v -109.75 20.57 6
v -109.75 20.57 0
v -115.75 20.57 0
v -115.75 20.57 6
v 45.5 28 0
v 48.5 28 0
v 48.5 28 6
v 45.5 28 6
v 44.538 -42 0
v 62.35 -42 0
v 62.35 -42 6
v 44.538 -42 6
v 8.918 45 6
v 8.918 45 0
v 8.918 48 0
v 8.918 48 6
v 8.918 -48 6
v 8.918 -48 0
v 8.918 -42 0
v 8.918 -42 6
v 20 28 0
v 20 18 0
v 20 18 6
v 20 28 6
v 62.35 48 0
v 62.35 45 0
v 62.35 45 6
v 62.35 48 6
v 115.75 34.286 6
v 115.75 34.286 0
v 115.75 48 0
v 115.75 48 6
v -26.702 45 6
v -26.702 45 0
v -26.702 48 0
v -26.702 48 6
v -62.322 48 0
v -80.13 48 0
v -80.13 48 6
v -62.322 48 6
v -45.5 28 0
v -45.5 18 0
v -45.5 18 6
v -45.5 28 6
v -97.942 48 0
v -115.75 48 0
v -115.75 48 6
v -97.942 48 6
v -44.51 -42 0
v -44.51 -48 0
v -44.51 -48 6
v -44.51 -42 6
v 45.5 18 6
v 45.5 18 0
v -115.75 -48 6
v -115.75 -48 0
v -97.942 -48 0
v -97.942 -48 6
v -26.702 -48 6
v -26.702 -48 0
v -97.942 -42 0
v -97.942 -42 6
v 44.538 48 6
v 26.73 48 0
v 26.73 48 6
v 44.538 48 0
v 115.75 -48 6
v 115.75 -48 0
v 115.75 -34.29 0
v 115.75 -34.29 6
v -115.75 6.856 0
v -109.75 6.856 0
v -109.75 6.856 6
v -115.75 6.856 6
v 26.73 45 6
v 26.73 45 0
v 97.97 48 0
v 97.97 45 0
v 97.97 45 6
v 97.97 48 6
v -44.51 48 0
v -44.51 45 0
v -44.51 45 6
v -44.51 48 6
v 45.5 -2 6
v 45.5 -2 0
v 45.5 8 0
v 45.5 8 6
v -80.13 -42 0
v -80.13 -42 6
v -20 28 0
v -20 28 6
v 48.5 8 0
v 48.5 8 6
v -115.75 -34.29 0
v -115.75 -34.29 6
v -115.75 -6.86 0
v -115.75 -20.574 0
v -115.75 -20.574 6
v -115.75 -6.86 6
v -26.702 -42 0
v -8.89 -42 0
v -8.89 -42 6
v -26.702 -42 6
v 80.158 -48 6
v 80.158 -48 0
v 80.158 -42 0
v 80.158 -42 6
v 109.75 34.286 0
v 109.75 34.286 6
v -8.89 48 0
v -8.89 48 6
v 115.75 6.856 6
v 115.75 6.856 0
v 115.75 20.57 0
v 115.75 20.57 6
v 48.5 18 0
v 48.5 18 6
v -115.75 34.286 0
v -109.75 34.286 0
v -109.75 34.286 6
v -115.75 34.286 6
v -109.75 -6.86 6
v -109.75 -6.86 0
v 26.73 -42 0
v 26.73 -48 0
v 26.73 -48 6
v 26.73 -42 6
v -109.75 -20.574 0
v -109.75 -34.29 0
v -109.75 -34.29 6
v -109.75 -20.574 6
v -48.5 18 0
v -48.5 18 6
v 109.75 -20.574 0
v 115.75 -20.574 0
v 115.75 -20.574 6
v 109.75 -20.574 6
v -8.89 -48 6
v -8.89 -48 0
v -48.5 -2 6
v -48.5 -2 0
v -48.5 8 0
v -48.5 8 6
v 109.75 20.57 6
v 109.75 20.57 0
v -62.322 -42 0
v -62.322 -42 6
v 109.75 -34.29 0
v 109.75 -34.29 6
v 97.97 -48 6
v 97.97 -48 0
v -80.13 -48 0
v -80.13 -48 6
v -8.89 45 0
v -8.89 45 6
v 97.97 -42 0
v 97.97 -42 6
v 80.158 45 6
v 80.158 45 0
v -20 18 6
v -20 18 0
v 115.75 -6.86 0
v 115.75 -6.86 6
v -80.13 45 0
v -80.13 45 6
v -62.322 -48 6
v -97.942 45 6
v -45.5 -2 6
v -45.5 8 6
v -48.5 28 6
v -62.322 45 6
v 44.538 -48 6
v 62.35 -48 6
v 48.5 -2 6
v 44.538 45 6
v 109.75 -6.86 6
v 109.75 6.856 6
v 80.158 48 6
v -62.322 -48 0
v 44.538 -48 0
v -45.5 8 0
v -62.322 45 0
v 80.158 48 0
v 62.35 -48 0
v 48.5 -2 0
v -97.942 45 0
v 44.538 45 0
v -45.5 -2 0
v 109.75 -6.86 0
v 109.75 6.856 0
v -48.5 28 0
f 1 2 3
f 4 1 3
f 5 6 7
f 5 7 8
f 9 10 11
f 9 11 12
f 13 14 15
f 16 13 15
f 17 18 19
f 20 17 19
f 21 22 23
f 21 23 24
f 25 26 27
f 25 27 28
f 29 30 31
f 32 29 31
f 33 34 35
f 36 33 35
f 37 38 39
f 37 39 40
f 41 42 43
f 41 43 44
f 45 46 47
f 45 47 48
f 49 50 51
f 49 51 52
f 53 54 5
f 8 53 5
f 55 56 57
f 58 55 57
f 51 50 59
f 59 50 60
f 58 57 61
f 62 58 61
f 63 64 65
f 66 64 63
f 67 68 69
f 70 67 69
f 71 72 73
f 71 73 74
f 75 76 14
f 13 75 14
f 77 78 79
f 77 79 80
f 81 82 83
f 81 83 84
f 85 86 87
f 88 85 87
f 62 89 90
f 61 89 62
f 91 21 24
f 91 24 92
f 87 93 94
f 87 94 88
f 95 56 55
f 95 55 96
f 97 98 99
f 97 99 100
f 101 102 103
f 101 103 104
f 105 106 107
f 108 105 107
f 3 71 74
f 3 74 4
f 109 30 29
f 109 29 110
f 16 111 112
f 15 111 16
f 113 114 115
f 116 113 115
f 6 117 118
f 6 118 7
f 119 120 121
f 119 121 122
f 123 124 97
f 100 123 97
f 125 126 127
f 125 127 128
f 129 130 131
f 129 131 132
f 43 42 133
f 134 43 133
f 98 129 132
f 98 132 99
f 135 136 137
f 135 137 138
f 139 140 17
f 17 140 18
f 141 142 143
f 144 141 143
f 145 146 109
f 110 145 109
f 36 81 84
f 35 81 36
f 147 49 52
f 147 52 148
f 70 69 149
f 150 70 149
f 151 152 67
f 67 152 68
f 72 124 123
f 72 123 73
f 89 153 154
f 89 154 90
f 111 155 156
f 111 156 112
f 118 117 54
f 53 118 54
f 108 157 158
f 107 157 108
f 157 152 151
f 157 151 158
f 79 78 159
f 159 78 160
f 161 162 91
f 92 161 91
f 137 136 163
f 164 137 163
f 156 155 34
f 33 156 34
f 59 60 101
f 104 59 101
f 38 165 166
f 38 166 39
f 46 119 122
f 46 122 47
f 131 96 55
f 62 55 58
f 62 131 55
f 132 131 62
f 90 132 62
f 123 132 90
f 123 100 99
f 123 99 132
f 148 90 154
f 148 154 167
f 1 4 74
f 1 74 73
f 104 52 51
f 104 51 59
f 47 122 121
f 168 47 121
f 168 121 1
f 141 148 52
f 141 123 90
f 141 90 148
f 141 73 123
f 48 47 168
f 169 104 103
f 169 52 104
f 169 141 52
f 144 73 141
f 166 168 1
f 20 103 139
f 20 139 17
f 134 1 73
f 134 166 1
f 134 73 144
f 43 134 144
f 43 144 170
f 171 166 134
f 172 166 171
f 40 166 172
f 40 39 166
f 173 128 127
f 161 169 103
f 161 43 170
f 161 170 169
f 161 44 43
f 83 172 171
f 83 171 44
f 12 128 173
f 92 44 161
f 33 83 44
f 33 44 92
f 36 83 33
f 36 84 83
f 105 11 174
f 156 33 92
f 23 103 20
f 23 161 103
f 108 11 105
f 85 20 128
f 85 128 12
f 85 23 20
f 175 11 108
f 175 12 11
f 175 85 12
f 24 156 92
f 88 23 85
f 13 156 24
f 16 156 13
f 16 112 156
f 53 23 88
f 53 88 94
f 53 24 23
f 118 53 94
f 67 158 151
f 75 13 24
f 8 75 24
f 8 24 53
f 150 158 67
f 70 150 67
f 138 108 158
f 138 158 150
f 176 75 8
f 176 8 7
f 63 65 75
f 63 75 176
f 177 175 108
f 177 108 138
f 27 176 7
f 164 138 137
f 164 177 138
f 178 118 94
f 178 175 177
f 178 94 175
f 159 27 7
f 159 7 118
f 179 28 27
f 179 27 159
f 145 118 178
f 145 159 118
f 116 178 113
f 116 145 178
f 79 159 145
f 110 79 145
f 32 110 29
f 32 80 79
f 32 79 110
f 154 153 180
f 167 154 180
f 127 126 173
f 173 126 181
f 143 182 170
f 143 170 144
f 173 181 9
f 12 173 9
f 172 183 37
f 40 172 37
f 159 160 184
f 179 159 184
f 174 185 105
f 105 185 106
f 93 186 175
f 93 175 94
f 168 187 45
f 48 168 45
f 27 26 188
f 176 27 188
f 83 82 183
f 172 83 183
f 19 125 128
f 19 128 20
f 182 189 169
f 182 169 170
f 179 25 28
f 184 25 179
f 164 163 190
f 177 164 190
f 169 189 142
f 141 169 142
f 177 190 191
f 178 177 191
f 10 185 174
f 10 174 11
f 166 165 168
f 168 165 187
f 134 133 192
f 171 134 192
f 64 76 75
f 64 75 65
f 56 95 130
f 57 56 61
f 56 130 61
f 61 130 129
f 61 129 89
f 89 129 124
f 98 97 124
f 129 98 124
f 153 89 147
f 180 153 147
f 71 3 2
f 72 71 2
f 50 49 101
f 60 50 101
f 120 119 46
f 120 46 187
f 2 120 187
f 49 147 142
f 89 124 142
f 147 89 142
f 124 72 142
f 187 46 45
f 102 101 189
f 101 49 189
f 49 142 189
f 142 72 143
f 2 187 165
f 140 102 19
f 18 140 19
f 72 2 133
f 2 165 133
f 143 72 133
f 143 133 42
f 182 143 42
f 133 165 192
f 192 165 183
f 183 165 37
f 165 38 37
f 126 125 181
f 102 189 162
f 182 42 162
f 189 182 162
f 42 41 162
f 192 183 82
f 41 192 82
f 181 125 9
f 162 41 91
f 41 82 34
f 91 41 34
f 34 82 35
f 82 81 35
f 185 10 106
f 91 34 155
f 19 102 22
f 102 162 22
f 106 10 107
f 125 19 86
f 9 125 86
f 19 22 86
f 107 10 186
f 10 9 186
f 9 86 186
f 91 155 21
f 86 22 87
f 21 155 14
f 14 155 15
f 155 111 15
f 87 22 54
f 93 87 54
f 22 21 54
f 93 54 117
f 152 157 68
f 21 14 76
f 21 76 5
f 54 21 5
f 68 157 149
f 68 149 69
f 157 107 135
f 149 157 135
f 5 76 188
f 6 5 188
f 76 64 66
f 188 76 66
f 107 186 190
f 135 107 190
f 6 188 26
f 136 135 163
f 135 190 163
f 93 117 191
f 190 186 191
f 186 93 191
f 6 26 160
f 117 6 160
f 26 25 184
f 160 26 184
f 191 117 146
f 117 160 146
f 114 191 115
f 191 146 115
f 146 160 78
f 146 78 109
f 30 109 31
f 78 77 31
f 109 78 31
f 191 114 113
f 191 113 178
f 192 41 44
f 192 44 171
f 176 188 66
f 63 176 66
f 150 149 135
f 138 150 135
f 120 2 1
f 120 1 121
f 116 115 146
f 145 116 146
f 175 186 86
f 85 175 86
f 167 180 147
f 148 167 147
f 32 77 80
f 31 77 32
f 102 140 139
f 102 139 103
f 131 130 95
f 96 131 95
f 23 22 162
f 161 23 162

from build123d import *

# Parameters (mm, degrees)
ESBO_O1_W                = 231.5
ESBO_O1_H                = 96
RESSALTO_EXTRUS_O1_DEPTH = 6
CORTE_EXTRUS_O1_REACH    = 127.451
ESBO_O2_W                = 17.812307692
ESBO_O2_H                = 6
CORTE_EXTRUS_O3_REACH    = 127.451
ESBO_O4_W                = 6
ESBO_O4_H                = 13.715714286
CORTE_EXTRUS_O4_REACH    = 127.451
ESBO_O5_W                = 40
ESBO_O5_H                = 10
CORTE_EXTRUS_O5_REACH    = 127.451
ESBO_O6_W                = 3
ESBO_O6_H                = 10


with BuildPart() as part:
    # Esboço1 → Ressalto-extrusão1 (new body)
    with BuildSketch(Plane.XY):
        Rectangle(ESBO_O1_W, ESBO_O1_H)
    extrude(amount=RESSALTO_EXTRUS_O1_DEPTH)

    # Esboço2 → Corte-extrusão1 (cut, up to next)
    with BuildSketch(Plane(origin=(0, 0, 0), x_dir=(-1, 0, 0), z_dir=(0, 0, -1)), mode=Mode.PRIVATE) as corte_extrus_o1_sk1:
        with Locations((17.796153846, -45)):
            Rectangle(ESBO_O2_W, ESBO_O2_H)
    corte_extrus_o1_tool1 = extrude(corte_extrus_o1_sk1.sketch, amount=-CORTE_EXTRUS_O1_REACH, mode=Mode.PRIVATE) & part.part
    # Esboço2 → Corte-extrusão1 (cut, up to next)
    with BuildSketch(Plane(origin=(0, 0, 0), x_dir=(-1, 0, 0), z_dir=(0, 0, -1)), mode=Mode.PRIVATE) as corte_extrus_o1_sk2:
        with Locations((53.416153846, -45)):
            Rectangle(ESBO_O2_W, ESBO_O2_H)
    corte_extrus_o1_tool2 = extrude(corte_extrus_o1_sk2.sketch, amount=-CORTE_EXTRUS_O1_REACH, mode=Mode.PRIVATE) & part.part
    # Esboço2 → Corte-extrusão1 (cut, up to next)
    with BuildSketch(Plane(origin=(0, 0, 0), x_dir=(-1, 0, 0), z_dir=(0, 0, -1)), mode=Mode.PRIVATE) as corte_extrus_o1_sk3:
        with Locations((89.036153846, -45)):
            Rectangle(ESBO_O2_W, ESBO_O2_H)
    corte_extrus_o1_tool3 = extrude(corte_extrus_o1_sk3.sketch, amount=-CORTE_EXTRUS_O1_REACH, mode=Mode.PRIVATE) & part.part
    # Esboço2 → Corte-extrusão1 (cut, up to next)
    with BuildSketch(Plane(origin=(0, 0, 0), x_dir=(-1, 0, 0), z_dir=(0, 0, -1)), mode=Mode.PRIVATE) as corte_extrus_o1_sk4:
        with Locations((-17.823846154, -45)):
            Rectangle(ESBO_O2_W, ESBO_O2_H)
    corte_extrus_o1_tool4 = extrude(corte_extrus_o1_sk4.sketch, amount=-CORTE_EXTRUS_O1_REACH, mode=Mode.PRIVATE) & part.part
    # Esboço2 → Corte-extrusão1 (cut, up to next)
    with BuildSketch(Plane(origin=(0, 0, 0), x_dir=(-1, 0, 0), z_dir=(0, 0, -1)), mode=Mode.PRIVATE) as corte_extrus_o1_sk5:
        with Locations((-53.443846154, -45)):
            Rectangle(ESBO_O2_W, ESBO_O2_H)
    corte_extrus_o1_tool5 = extrude(corte_extrus_o1_sk5.sketch, amount=-CORTE_EXTRUS_O1_REACH, mode=Mode.PRIVATE) & part.part
    # Esboço2 → Corte-extrusão1 (cut, up to next)
    with BuildSketch(Plane(origin=(0, 0, 0), x_dir=(-1, 0, 0), z_dir=(0, 0, -1)), mode=Mode.PRIVATE) as corte_extrus_o1_sk6:
        with Locations((-89.063846154, -45)):
            Rectangle(ESBO_O2_W, ESBO_O2_H)
    corte_extrus_o1_tool6 = extrude(corte_extrus_o1_sk6.sketch, amount=-CORTE_EXTRUS_O1_REACH, mode=Mode.PRIVATE) & part.part
    # Esboço2 → Corte-extrusão1 (cut, up to next)
    with BuildSketch(Plane(origin=(0, 0, 0), x_dir=(-1, 0, 0), z_dir=(0, 0, -1)), mode=Mode.PRIVATE) as corte_extrus_o1_sk7:
        with Locations((-89.063846154, 48)):
            Rectangle(ESBO_O2_W, ESBO_O2_H)
    corte_extrus_o1_tool7 = extrude(corte_extrus_o1_sk7.sketch, amount=-CORTE_EXTRUS_O1_REACH, mode=Mode.PRIVATE) & part.part
    # Esboço2 → Corte-extrusão1 (cut, up to next)
    with BuildSketch(Plane(origin=(0, 0, 0), x_dir=(-1, 0, 0), z_dir=(0, 0, -1)), mode=Mode.PRIVATE) as corte_extrus_o1_sk8:
        with Locations((-53.443846154, 48)):
            Rectangle(ESBO_O2_W, ESBO_O2_H)
    corte_extrus_o1_tool8 = extrude(corte_extrus_o1_sk8.sketch, amount=-CORTE_EXTRUS_O1_REACH, mode=Mode.PRIVATE) & part.part
    # Esboço2 → Corte-extrusão1 (cut, up to next)
    with BuildSketch(Plane(origin=(0, 0, 0), x_dir=(-1, 0, 0), z_dir=(0, 0, -1)), mode=Mode.PRIVATE) as corte_extrus_o1_sk9:
        with Locations((-17.823846154, 48)):
            Rectangle(ESBO_O2_W, ESBO_O2_H)
    corte_extrus_o1_tool9 = extrude(corte_extrus_o1_sk9.sketch, amount=-CORTE_EXTRUS_O1_REACH, mode=Mode.PRIVATE) & part.part
    # Esboço2 → Corte-extrusão1 (cut, up to next)
    with BuildSketch(Plane(origin=(0, 0, 0), x_dir=(-1, 0, 0), z_dir=(0, 0, -1)), mode=Mode.PRIVATE) as corte_extrus_o1_sk10:
        with Locations((17.796153846, 48)):
            Rectangle(ESBO_O2_W, ESBO_O2_H)
    corte_extrus_o1_tool10 = extrude(corte_extrus_o1_sk10.sketch, amount=-CORTE_EXTRUS_O1_REACH, mode=Mode.PRIVATE) & part.part
    # Esboço2 → Corte-extrusão1 (cut, up to next)
    with BuildSketch(Plane(origin=(0, 0, 0), x_dir=(-1, 0, 0), z_dir=(0, 0, -1)), mode=Mode.PRIVATE) as corte_extrus_o1_sk11:
        with Locations((89.036153846, 48)):
            Rectangle(ESBO_O2_W, ESBO_O2_H)
    corte_extrus_o1_tool11 = extrude(corte_extrus_o1_sk11.sketch, amount=-CORTE_EXTRUS_O1_REACH, mode=Mode.PRIVATE) & part.part
    # Esboço2 → Corte-extrusão1 (cut, up to next)
    with BuildSketch(Plane(origin=(0, 0, 0), x_dir=(-1, 0, 0), z_dir=(0, 0, -1)), mode=Mode.PRIVATE) as corte_extrus_o1_sk12:
        with Locations((53.416153846, 48)):
            Rectangle(ESBO_O2_W, ESBO_O2_H)
    corte_extrus_o1_tool12 = extrude(corte_extrus_o1_sk12.sketch, amount=-CORTE_EXTRUS_O1_REACH, mode=Mode.PRIVATE) & part.part
    add(corte_extrus_o1_tool1.solids().sort_by_distance((-17.796154, -45, 0))[0], mode=Mode.SUBTRACT)
    add(corte_extrus_o1_tool2.solids().sort_by_distance((-53.416154, -45, 0))[0], mode=Mode.SUBTRACT)
    add(corte_extrus_o1_tool3.solids().sort_by_distance((-89.036154, -45, 0))[0], mode=Mode.SUBTRACT)
    add(corte_extrus_o1_tool4.solids().sort_by_distance((17.823846, -45, 0))[0], mode=Mode.SUBTRACT)
    add(corte_extrus_o1_tool5.solids().sort_by_distance((53.443846, -45, 0))[0], mode=Mode.SUBTRACT)
    add(corte_extrus_o1_tool6.solids().sort_by_distance((89.063846, -45, 0))[0], mode=Mode.SUBTRACT)
    add(corte_extrus_o1_tool7.solids().sort_by_distance((89.063846, 48, 0))[0], mode=Mode.SUBTRACT)
    add(corte_extrus_o1_tool8.solids().sort_by_distance((53.443846, 48, 0))[0], mode=Mode.SUBTRACT)
    add(corte_extrus_o1_tool9.solids().sort_by_distance((17.823846, 48, 0))[0], mode=Mode.SUBTRACT)
    add(corte_extrus_o1_tool10.solids().sort_by_distance((-17.796154, 48, 0))[0], mode=Mode.SUBTRACT)
    add(corte_extrus_o1_tool11.solids().sort_by_distance((-89.036154, 48, 0))[0], mode=Mode.SUBTRACT)
    add(corte_extrus_o1_tool12.solids().sort_by_distance((-53.416154, 48, 0))[0], mode=Mode.SUBTRACT)

    # Esboço4 → Corte-extrusão3 (cut, up to next)
    with BuildSketch(Plane(origin=(0, 0, 0), x_dir=(-1, 0, 0), z_dir=(0, 0, -1)), mode=Mode.PRIVATE) as corte_extrus_o3_sk1:
        with Locations((112.75, -0.002142857)):
            Rectangle(ESBO_O4_W, ESBO_O4_H)
    corte_extrus_o3_tool1 = extrude(corte_extrus_o3_sk1.sketch, amount=-CORTE_EXTRUS_O3_REACH, mode=Mode.PRIVATE) & part.part
    # Esboço4 → Corte-extrusão3 (cut, up to next)
    with BuildSketch(Plane(origin=(0, 0, 0), x_dir=(-1, 0, 0), z_dir=(0, 0, -1)), mode=Mode.PRIVATE) as corte_extrus_o3_sk2:
        with Locations((112.75, 27.427857143)):
            Rectangle(ESBO_O4_W, ESBO_O4_H)
    corte_extrus_o3_tool2 = extrude(corte_extrus_o3_sk2.sketch, amount=-CORTE_EXTRUS_O3_REACH, mode=Mode.PRIVATE) & part.part
    # Esboço4 → Corte-extrusão3 (cut, up to next)
    with BuildSketch(Plane(origin=(0, 0, 0), x_dir=(-1, 0, 0), z_dir=(0, 0, -1)), mode=Mode.PRIVATE) as corte_extrus_o3_sk3:
        with Locations((-112.75, 27.427857143)):
            Rectangle(ESBO_O4_W, ESBO_O4_H)
    corte_extrus_o3_tool3 = extrude(corte_extrus_o3_sk3.sketch, amount=-CORTE_EXTRUS_O3_REACH, mode=Mode.PRIVATE) & part.part
    # Esboço4 → Corte-extrusão3 (cut, up to next)
    with BuildSketch(Plane(origin=(0, 0, 0), x_dir=(-1, 0, 0), z_dir=(0, 0, -1)), mode=Mode.PRIVATE) as corte_extrus_o3_sk4:
        with Locations((-112.75, -0.002142857)):
            Rectangle(ESBO_O4_W, ESBO_O4_H)
    corte_extrus_o3_tool4 = extrude(corte_extrus_o3_sk4.sketch, amount=-CORTE_EXTRUS_O3_REACH, mode=Mode.PRIVATE) & part.part
    # Esboço4 → Corte-extrusão3 (cut, up to next)
    with BuildSketch(Plane(origin=(0, 0, 0), x_dir=(-1, 0, 0), z_dir=(0, 0, -1)), mode=Mode.PRIVATE) as corte_extrus_o3_sk5:
        with Locations((-112.75, -27.432142857)):
            Rectangle(ESBO_O4_W, ESBO_O4_H)
    corte_extrus_o3_tool5 = extrude(corte_extrus_o3_sk5.sketch, amount=-CORTE_EXTRUS_O3_REACH, mode=Mode.PRIVATE) & part.part
    # Esboço4 → Corte-extrusão3 (cut, up to next)
    with BuildSketch(Plane(origin=(0, 0, 0), x_dir=(-1, 0, 0), z_dir=(0, 0, -1)), mode=Mode.PRIVATE) as corte_extrus_o3_sk6:
        with Locations((112.75, -27.432142857)):
            Rectangle(ESBO_O4_W, ESBO_O4_H)
    corte_extrus_o3_tool6 = extrude(corte_extrus_o3_sk6.sketch, amount=-CORTE_EXTRUS_O3_REACH, mode=Mode.PRIVATE) & part.part
    add(corte_extrus_o3_tool1.solids().sort_by_distance((-112.75, -0.002143, 0))[0], mode=Mode.SUBTRACT)
    add(corte_extrus_o3_tool2.solids().sort_by_distance((-112.75, 27.427857, 0))[0], mode=Mode.SUBTRACT)
    add(corte_extrus_o3_tool3.solids().sort_by_distance((112.75, 27.427857, 0))[0], mode=Mode.SUBTRACT)
    add(corte_extrus_o3_tool4.solids().sort_by_distance((112.75, -0.002143, 0))[0], mode=Mode.SUBTRACT)
    add(corte_extrus_o3_tool5.solids().sort_by_distance((112.75, -27.432143, 0))[0], mode=Mode.SUBTRACT)
    add(corte_extrus_o3_tool6.solids().sort_by_distance((-112.75, -27.432143, 0))[0], mode=Mode.SUBTRACT)

    # Esboço5 → Corte-extrusão4 (cut, up to next)
    with BuildSketch(Plane(origin=(0, 0, 0), x_dir=(-1, 0, 0), z_dir=(0, 0, -1)), mode=Mode.PRIVATE) as corte_extrus_o4_sk1:
        with Locations((0, 23)):
            Rectangle(ESBO_O5_W, ESBO_O5_H)
    corte_extrus_o4_tool1 = extrude(corte_extrus_o4_sk1.sketch, amount=-CORTE_EXTRUS_O4_REACH, mode=Mode.PRIVATE) & part.part
    add(corte_extrus_o4_tool1.solids().sort_by_distance((0, 23, 0))[0], mode=Mode.SUBTRACT)

    # Esboço6 → Corte-extrusão5 (cut, up to next)
    with BuildSketch(Plane(origin=(0, 0, 0), x_dir=(-1, 0, 0), z_dir=(0, 0, -1)), mode=Mode.PRIVATE) as corte_extrus_o5_sk1:
        with Locations((47, 23)):
            Rectangle(ESBO_O6_W, ESBO_O6_H)
    corte_extrus_o5_tool1 = extrude(corte_extrus_o5_sk1.sketch, amount=-CORTE_EXTRUS_O5_REACH, mode=Mode.PRIVATE) & part.part
    # Esboço6 → Corte-extrusão5 (cut, up to next)
    with BuildSketch(Plane(origin=(0, 0, 0), x_dir=(-1, 0, 0), z_dir=(0, 0, -1)), mode=Mode.PRIVATE) as corte_extrus_o5_sk2:
        with Locations((-47, 23)):
            Rectangle(ESBO_O6_W, ESBO_O6_H)
    corte_extrus_o5_tool2 = extrude(corte_extrus_o5_sk2.sketch, amount=-CORTE_EXTRUS_O5_REACH, mode=Mode.PRIVATE) & part.part
    # Esboço6 → Corte-extrusão5 (cut, up to next)
    with BuildSketch(Plane(origin=(0, 0, 0), x_dir=(-1, 0, 0), z_dir=(0, 0, -1)), mode=Mode.PRIVATE) as corte_extrus_o5_sk3:
        with Locations((-47, 3)):
            Rectangle(ESBO_O6_W, ESBO_O6_H)
    corte_extrus_o5_tool3 = extrude(corte_extrus_o5_sk3.sketch, amount=-CORTE_EXTRUS_O5_REACH, mode=Mode.PRIVATE) & part.part
    # Esboço6 → Corte-extrusão5 (cut, up to next)
    with BuildSketch(Plane(origin=(0, 0, 0), x_dir=(-1, 0, 0), z_dir=(0, 0, -1)), mode=Mode.PRIVATE) as corte_extrus_o5_sk4:
        with Locations((47, 3)):
            Rectangle(ESBO_O6_W, ESBO_O6_H)
    corte_extrus_o5_tool4 = extrude(corte_extrus_o5_sk4.sketch, amount=-CORTE_EXTRUS_O5_REACH, mode=Mode.PRIVATE) & part.part
    add(corte_extrus_o5_tool1.solids().sort_by_distance((-47, 23, 0))[0], mode=Mode.SUBTRACT)
    add(corte_extrus_o5_tool2.solids().sort_by_distance((47, 23, 0))[0], mode=Mode.SUBTRACT)
    add(corte_extrus_o5_tool3.solids().sort_by_distance((47, 3, 0))[0], mode=Mode.SUBTRACT)
    add(corte_extrus_o5_tool4.solids().sort_by_distance((-47, 3, 0))[0], mode=Mode.SUBTRACT)


solid = part.part
